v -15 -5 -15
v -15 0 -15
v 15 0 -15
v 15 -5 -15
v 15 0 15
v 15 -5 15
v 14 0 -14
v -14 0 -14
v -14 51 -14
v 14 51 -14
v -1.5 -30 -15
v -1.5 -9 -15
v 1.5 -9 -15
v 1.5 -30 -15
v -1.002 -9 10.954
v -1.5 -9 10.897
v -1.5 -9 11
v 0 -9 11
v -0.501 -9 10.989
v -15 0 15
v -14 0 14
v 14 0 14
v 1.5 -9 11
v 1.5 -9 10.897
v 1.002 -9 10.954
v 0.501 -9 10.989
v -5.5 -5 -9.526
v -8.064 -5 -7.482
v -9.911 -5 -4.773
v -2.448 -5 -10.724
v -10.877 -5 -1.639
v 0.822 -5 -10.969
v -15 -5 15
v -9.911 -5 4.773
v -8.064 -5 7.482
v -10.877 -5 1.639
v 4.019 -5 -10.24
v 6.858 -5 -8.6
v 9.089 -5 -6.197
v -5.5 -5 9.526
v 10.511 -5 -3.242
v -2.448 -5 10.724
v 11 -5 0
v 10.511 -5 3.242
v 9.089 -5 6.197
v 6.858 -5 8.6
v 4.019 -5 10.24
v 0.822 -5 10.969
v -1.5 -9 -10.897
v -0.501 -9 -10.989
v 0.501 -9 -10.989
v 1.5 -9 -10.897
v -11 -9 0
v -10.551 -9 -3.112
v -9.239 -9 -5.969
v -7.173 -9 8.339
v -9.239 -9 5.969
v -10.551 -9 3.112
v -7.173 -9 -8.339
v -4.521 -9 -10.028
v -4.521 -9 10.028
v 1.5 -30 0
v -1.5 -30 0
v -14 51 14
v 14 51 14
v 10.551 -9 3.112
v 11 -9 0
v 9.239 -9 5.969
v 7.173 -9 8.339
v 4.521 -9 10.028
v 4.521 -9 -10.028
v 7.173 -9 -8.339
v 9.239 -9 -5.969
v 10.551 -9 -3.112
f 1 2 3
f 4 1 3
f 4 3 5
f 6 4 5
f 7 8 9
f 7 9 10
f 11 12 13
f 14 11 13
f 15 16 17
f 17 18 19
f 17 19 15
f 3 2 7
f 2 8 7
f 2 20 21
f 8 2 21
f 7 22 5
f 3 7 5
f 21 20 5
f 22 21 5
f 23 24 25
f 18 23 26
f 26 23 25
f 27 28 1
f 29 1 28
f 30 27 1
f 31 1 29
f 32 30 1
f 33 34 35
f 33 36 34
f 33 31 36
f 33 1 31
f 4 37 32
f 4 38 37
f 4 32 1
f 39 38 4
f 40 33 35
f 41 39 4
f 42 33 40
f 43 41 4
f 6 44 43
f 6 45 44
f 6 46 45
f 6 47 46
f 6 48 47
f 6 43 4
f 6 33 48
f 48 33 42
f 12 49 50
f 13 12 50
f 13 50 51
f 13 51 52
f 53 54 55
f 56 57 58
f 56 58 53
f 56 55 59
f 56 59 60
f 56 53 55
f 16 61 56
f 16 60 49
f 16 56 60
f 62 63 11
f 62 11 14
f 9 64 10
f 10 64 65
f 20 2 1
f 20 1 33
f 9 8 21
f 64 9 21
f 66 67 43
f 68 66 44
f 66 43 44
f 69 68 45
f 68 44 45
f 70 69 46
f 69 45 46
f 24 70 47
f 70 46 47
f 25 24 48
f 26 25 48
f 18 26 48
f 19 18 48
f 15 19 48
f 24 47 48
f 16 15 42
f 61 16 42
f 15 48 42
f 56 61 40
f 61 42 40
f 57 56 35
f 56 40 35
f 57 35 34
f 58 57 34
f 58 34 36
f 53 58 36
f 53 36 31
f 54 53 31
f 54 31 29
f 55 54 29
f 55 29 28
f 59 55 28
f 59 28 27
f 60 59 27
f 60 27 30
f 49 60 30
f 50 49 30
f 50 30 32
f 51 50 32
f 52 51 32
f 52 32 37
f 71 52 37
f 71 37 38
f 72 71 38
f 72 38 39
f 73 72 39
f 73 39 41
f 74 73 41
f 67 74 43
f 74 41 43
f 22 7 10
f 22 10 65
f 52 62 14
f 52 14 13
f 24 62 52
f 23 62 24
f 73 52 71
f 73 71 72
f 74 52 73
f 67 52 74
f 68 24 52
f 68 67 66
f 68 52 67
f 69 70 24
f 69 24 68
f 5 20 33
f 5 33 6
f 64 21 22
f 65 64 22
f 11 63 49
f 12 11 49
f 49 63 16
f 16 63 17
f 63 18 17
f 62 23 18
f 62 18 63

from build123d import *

# Parameters (mm, degrees)
F0_W     = 28
F0_H     = 28
F1_DEPTH = 51
F2_W     = 30
F2_H     = 30
F3_DEPTH = 5
F4_R     = 11
F5_DEPTH = 4
F6_W     = 3
F6_H     = 15
F7_DEPTH = 21
F9_DEPTH = 3


with BuildPart() as f1:
    # F0 (on Front) → F1 (new body)
    with BuildSketch(Plane.XZ):
        Rectangle(F0_W, F0_H)
    extrude(amount=-F1_DEPTH)

    # F2 (on Front) → F3 (join)
    with BuildSketch(Plane.XZ):
        Rectangle(F2_W, F2_H)
    extrude(amount=F3_DEPTH)

    # F4 (on face) → F5 (join)
    with BuildSketch(Plane.XZ.offset(5)):
        Circle(F4_R)
    extrude(amount=F5_DEPTH)

    # F6 (on face) → F7 (join)
    with BuildSketch(Plane.XZ.offset(9)):
        with Locations((0, -7.5)):
            Rectangle(F6_W, F6_H)
    extrude(amount=F7_DEPTH)

    # F8 (on face) → F9 (join)
    with BuildSketch(Plane.YZ.offset(1.5)):
        Polygon((-9, 11), (-30, 0), (-9, 0), align=None)
    extrude(amount=-F9_DEPTH)


solid = f1.part
